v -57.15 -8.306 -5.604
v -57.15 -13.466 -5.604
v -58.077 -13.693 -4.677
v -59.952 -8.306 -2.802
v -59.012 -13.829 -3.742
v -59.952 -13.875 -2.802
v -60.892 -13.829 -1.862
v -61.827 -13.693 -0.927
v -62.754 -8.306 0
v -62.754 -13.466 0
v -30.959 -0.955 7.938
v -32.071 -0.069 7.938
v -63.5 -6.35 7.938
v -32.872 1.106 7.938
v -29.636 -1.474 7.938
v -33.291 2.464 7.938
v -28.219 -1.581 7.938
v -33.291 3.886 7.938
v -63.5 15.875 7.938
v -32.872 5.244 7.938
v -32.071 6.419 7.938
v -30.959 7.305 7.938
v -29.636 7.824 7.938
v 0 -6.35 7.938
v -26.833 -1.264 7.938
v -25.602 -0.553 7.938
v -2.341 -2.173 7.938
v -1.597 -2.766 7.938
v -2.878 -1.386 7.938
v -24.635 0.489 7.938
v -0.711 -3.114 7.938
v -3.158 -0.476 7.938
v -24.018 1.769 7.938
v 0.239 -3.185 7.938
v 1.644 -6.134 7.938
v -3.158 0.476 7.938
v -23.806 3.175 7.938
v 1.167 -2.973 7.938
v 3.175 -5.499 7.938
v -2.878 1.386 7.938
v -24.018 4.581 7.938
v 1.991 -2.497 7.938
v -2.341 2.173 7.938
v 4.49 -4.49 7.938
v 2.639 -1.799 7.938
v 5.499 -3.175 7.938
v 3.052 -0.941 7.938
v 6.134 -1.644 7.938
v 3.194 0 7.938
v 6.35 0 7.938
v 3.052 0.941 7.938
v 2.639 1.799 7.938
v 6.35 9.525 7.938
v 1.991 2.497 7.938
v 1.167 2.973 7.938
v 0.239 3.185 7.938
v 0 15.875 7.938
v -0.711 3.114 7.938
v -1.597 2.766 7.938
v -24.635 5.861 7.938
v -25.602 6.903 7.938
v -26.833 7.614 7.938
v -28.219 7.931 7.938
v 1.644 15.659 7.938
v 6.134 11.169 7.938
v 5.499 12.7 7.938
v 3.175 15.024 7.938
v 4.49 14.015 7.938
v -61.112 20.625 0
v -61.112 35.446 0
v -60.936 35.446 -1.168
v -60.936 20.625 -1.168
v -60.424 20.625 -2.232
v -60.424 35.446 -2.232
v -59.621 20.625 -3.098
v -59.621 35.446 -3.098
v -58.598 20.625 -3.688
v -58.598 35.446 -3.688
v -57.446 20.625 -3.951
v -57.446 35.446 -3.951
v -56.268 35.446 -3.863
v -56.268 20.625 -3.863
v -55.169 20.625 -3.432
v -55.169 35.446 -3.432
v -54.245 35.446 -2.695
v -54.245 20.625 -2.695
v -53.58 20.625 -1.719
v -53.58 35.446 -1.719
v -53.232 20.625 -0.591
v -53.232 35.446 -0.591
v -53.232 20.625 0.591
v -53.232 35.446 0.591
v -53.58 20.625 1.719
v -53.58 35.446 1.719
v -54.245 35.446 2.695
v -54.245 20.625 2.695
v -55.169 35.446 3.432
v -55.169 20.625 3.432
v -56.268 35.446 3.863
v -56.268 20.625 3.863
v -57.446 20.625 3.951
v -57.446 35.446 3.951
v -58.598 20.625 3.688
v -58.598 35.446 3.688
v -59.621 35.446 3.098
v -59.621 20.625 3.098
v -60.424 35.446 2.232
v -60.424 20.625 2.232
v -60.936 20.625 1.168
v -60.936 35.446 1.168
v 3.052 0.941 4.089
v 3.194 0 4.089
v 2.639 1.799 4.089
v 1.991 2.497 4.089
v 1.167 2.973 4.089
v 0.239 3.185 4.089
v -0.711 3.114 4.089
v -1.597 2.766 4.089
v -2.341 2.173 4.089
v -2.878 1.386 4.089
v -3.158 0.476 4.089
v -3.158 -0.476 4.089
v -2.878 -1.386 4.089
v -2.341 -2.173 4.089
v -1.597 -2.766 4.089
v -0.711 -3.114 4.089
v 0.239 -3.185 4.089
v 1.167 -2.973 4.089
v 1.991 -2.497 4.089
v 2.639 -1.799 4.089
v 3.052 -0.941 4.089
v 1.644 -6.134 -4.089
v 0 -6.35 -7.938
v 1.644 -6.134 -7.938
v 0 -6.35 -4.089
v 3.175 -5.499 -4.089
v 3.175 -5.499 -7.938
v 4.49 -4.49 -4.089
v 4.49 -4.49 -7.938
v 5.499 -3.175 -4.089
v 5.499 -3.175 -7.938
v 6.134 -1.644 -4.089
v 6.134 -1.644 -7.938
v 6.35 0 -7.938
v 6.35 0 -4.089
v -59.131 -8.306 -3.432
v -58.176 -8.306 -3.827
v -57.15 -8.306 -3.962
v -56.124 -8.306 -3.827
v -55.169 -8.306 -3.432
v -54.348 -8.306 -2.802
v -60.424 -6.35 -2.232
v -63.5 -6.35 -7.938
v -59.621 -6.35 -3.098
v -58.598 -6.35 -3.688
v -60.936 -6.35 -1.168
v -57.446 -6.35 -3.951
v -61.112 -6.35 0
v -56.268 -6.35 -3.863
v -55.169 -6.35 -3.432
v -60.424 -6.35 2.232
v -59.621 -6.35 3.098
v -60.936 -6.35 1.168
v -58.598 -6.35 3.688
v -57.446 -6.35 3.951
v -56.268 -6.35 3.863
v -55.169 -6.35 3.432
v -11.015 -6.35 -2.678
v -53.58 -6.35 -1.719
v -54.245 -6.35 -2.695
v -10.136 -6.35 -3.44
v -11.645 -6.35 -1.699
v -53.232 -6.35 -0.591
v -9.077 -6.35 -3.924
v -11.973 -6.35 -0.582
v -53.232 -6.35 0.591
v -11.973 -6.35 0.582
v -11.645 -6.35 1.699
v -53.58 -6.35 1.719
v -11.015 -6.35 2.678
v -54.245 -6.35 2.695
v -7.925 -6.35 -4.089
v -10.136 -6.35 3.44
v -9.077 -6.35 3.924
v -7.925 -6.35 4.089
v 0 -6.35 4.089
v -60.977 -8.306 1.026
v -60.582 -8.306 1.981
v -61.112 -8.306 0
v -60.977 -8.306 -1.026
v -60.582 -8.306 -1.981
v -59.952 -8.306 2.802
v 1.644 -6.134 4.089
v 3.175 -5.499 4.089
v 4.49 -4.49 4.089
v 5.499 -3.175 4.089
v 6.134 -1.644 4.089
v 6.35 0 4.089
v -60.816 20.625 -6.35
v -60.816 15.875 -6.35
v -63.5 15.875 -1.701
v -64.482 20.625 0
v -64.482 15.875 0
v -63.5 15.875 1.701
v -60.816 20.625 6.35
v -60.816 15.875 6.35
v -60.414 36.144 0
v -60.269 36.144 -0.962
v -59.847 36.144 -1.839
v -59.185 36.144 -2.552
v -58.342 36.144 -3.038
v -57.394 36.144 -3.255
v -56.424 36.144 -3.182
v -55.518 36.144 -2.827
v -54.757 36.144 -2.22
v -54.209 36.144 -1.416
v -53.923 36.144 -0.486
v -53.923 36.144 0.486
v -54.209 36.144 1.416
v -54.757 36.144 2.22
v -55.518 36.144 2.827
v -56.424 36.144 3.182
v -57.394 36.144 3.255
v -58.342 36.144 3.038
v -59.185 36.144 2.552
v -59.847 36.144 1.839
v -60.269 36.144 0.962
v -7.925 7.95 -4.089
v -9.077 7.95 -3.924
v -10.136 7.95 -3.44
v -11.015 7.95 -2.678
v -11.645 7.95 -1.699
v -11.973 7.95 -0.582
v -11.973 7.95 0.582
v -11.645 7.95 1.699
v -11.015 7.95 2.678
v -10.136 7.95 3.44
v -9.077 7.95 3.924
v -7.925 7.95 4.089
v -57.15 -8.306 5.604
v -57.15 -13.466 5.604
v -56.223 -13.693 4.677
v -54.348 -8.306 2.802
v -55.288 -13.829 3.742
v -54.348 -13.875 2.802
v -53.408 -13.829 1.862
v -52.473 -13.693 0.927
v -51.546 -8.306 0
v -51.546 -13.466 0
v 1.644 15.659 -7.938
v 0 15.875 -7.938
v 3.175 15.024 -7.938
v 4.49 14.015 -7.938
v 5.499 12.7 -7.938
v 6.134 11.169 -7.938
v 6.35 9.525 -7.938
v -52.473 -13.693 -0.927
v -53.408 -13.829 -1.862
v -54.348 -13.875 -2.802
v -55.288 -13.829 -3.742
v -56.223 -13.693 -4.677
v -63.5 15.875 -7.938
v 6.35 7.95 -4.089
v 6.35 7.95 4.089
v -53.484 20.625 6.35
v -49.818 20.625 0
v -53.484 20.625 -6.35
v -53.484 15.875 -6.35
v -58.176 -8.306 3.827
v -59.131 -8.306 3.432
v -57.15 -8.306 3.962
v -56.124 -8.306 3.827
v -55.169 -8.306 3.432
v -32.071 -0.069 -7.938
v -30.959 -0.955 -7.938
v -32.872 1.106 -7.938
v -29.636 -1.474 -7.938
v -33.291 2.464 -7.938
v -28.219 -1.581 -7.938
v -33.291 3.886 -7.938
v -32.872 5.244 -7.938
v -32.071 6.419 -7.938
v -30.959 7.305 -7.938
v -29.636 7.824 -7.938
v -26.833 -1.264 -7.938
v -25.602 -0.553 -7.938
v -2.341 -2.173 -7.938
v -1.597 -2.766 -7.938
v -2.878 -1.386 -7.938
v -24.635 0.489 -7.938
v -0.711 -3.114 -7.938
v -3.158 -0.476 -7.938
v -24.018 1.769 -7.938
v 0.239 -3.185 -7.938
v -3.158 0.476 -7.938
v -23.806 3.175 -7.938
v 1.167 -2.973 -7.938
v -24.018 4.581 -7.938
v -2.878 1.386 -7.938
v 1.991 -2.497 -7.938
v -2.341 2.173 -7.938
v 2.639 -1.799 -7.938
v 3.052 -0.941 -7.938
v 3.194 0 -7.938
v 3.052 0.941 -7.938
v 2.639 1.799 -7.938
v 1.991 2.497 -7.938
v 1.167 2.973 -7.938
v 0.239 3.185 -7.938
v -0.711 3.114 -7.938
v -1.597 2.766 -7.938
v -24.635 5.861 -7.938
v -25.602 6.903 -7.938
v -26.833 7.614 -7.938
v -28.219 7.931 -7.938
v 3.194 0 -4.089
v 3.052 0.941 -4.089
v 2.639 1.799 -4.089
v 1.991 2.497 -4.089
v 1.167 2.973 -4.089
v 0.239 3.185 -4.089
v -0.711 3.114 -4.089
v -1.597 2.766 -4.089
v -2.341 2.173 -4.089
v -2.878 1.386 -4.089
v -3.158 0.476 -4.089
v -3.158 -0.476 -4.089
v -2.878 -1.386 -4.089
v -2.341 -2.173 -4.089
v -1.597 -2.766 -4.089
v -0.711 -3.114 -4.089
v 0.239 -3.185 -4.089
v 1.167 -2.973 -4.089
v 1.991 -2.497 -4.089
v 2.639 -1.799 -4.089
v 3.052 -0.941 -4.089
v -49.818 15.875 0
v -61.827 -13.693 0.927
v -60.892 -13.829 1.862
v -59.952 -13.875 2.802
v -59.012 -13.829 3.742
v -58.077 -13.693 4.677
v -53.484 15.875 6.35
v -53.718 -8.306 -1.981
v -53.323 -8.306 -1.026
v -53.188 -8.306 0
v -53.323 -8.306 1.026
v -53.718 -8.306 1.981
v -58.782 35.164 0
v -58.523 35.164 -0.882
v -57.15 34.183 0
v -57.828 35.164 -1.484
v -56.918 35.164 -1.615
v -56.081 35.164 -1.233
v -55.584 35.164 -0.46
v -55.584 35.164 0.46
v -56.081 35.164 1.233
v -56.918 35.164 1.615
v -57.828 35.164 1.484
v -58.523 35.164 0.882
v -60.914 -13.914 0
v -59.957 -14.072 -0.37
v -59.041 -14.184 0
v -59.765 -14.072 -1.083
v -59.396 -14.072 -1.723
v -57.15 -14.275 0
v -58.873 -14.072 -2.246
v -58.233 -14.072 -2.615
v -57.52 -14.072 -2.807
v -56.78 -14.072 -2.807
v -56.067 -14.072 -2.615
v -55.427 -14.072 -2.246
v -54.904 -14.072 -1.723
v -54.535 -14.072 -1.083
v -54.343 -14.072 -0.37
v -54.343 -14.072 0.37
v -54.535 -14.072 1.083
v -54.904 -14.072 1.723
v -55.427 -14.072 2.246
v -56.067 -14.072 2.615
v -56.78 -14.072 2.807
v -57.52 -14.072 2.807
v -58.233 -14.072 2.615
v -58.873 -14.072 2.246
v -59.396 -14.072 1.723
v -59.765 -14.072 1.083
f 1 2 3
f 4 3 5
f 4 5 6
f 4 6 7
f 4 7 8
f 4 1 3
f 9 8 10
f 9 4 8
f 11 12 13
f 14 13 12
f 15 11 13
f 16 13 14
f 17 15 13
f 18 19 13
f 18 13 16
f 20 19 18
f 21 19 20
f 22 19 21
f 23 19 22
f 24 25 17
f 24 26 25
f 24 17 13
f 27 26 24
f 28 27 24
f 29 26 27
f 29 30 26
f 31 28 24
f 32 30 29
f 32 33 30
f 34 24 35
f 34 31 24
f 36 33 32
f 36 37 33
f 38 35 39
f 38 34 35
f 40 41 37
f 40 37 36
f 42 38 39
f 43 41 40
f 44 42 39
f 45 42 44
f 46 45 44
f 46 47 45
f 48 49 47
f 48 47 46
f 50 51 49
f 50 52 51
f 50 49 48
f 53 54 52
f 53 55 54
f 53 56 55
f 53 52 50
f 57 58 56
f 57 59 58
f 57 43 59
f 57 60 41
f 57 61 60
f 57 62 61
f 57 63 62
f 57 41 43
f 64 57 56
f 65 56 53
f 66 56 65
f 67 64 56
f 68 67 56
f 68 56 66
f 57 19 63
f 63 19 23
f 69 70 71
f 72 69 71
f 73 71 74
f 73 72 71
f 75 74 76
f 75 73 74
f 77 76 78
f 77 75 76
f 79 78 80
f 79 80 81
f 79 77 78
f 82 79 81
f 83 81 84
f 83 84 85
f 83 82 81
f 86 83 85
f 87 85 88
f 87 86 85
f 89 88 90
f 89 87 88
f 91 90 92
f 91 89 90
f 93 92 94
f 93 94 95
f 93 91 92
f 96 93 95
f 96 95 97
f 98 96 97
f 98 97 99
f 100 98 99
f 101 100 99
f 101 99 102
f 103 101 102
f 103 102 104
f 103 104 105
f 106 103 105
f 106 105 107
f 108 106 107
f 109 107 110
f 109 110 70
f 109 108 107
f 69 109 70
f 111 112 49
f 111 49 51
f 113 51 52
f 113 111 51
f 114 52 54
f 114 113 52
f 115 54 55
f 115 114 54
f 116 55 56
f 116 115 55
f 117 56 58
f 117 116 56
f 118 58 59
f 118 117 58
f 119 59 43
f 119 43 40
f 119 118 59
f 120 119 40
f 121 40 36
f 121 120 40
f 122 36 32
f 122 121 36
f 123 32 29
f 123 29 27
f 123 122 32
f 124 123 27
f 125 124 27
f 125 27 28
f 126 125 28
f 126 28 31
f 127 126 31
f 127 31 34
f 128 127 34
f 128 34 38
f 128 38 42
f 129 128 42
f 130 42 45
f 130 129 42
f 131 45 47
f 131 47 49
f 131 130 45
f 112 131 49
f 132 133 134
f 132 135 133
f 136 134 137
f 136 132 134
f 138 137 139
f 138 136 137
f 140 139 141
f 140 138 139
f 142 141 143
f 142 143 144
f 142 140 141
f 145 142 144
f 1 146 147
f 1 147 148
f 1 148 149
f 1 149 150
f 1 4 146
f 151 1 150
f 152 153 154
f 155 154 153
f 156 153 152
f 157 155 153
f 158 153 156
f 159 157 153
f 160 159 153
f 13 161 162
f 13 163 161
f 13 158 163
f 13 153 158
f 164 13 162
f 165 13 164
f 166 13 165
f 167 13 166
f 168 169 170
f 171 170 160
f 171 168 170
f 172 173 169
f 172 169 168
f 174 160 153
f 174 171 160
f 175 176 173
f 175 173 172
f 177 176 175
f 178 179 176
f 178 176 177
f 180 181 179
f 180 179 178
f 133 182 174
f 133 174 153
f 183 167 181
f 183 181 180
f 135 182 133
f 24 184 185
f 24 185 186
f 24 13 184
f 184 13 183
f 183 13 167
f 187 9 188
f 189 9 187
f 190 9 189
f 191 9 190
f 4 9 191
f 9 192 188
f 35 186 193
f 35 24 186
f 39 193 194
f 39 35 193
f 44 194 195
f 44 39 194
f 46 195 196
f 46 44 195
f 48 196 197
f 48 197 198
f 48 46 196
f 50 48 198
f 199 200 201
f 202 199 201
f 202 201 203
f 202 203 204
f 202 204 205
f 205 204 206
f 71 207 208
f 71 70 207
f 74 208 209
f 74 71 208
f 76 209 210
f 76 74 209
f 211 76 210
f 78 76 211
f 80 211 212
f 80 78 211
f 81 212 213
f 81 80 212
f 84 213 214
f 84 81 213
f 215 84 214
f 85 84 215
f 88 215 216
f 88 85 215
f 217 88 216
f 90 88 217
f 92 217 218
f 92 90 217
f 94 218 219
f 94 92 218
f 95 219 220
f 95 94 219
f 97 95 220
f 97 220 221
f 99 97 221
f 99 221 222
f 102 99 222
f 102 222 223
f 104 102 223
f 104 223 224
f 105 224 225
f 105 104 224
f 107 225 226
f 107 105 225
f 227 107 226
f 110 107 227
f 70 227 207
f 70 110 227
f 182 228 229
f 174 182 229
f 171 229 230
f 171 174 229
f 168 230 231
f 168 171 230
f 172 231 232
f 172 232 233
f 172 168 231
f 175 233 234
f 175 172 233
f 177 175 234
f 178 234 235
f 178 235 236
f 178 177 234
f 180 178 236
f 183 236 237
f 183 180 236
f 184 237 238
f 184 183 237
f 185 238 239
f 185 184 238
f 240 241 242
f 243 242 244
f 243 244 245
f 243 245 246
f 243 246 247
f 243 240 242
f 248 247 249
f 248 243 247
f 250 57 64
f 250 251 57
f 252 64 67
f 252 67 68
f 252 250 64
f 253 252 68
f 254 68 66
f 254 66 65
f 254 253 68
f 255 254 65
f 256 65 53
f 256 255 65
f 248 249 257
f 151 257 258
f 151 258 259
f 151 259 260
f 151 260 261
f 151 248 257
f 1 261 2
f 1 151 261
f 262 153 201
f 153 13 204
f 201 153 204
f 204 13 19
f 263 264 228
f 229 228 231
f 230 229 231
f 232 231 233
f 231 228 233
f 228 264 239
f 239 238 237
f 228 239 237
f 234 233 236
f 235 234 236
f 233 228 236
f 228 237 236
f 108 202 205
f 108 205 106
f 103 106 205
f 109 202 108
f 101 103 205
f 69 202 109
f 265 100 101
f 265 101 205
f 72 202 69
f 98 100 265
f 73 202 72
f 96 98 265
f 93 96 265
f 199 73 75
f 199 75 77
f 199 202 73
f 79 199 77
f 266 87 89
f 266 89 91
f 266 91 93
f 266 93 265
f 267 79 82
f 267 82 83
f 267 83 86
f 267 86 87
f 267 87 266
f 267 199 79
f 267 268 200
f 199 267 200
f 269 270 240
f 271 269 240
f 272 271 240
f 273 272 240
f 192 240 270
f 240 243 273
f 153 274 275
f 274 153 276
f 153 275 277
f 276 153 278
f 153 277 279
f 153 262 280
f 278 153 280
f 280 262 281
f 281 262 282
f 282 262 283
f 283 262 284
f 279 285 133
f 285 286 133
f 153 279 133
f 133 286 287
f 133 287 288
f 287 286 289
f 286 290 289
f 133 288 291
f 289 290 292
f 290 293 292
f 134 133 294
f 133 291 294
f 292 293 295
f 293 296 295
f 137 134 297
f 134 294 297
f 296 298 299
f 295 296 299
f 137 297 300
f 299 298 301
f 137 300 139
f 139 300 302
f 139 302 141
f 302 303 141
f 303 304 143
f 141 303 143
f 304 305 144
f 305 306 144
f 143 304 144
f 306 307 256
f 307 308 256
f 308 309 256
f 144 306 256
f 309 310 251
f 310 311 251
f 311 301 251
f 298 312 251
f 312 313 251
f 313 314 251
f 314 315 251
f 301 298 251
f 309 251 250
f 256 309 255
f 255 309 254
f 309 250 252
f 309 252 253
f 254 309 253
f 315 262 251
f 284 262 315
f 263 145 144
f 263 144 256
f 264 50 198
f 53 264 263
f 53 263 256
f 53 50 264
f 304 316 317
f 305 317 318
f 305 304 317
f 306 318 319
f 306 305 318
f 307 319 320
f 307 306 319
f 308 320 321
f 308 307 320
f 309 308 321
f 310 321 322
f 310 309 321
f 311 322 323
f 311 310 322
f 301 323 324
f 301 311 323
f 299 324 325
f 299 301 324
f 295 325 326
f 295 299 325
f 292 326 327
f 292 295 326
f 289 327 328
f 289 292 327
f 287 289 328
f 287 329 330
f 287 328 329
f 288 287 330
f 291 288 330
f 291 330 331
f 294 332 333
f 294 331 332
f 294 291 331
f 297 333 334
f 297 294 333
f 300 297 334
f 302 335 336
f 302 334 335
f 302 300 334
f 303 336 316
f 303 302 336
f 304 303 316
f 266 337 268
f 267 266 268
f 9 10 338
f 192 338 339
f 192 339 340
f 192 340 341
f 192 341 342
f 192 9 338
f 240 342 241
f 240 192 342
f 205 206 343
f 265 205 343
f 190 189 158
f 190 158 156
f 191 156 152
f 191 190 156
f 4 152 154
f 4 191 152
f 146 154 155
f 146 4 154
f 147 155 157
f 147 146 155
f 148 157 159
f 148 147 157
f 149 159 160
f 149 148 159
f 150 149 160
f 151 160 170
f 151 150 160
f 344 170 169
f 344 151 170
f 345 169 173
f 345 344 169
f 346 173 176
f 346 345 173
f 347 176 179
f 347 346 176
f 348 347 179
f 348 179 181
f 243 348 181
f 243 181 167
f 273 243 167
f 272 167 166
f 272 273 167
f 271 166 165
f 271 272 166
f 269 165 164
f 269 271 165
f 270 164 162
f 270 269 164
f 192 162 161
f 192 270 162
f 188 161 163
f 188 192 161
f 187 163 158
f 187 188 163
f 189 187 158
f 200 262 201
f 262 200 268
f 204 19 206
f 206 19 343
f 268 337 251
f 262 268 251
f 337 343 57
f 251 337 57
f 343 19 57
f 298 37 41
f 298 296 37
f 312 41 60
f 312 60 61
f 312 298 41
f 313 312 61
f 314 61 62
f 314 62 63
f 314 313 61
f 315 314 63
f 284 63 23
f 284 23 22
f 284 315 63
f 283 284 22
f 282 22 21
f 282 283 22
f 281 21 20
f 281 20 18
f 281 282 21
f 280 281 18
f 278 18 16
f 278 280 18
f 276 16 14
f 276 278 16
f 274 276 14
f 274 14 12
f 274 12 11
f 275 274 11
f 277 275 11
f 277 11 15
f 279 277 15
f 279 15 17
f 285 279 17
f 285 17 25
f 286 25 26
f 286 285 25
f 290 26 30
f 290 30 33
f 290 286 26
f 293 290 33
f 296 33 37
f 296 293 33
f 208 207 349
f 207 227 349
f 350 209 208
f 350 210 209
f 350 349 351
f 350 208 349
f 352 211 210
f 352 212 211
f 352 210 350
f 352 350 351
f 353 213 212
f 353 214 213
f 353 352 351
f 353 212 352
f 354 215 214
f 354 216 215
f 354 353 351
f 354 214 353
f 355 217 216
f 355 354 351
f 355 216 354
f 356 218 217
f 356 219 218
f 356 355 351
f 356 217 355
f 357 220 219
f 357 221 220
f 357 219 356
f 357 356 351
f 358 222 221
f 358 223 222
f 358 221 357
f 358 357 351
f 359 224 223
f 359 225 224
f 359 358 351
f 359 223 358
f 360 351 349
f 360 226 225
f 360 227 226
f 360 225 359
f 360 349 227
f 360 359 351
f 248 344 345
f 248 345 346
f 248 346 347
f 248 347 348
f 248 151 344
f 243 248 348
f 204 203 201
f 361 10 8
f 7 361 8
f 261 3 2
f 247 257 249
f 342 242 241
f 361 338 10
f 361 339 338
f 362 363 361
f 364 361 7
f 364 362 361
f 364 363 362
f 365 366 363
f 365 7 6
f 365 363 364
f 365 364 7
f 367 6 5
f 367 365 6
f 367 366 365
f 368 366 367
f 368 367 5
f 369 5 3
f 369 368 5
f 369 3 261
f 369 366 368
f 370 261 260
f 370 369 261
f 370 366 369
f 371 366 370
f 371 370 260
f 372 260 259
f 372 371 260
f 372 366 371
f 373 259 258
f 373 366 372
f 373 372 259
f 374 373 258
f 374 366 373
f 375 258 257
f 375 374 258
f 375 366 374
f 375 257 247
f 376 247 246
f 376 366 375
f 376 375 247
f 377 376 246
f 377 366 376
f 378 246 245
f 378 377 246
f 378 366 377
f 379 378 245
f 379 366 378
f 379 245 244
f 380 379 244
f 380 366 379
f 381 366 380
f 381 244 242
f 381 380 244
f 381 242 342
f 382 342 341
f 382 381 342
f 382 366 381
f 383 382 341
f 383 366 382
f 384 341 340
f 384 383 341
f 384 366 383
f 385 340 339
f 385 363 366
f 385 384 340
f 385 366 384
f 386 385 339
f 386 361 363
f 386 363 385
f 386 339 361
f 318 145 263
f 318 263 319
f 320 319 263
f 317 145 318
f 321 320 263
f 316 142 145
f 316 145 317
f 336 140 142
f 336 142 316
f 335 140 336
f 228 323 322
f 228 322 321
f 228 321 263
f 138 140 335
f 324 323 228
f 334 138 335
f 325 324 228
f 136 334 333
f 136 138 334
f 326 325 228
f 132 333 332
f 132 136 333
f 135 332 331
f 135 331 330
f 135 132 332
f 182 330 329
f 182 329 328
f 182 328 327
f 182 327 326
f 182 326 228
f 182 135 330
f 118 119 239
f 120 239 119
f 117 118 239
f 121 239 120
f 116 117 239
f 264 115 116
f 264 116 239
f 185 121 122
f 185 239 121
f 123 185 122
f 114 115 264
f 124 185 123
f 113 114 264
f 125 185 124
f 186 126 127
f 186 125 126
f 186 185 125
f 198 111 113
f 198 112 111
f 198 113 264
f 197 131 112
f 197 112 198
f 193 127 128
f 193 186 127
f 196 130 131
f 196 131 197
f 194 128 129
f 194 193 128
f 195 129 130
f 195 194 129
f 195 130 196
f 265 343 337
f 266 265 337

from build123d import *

# Parameters (mm, degrees)
SKETCH11_W         = 69.85
SKETCH11_H         = 22.225
SKETCH11_R         = 3.19405
SKETCH11_R_2       = 4.76885
EXTRUDE3_DEPTH     = 7.9375
CUT_EXTRUDE1_DEPTH = 14.3002
FILLET1_R          = 6.35
EXTRUDE4_DEPTH     = 4.7498
SKETCH15_R         = 13.386908493
CUT_EXTRUDE2_DEPTH = 6.969


with BuildPart() as part:
    # Sketch11 → Extrude3 (new body, symmetric)
    with BuildSketch(Plane.XY):
        with Locations((-28.575, 4.7625)):
            Rectangle(SKETCH11_W, SKETCH11_H)
        Circle(SKETCH11_R, mode=Mode.SUBTRACT)
        with Locations((-28.575, 3.175)):
            Circle(SKETCH11_R_2, mode=Mode.SUBTRACT)
    extrude(amount=EXTRUDE3_DEPTH, both=True)

    # Sketch12 → Cut-Extrude1 (cut)
    with BuildSketch(Plane.XZ.offset(6.35)):
        with BuildLine():
            Line((-7.9248, 4.0894), (6.35, 4.0894))
            Line((6.35, 4.0894), (6.35, -4.0894))
            Line((6.35, -4.0894), (-7.9248, -4.0894))
            ThreePointArc((-7.9248, -4.0894), (-12.0142, 0), (-7.9248, 4.0894))
        make_face()
    extrude(amount=-CUT_EXTRUDE1_DEPTH, mode=Mode.SUBTRACT)

    # Fillet1
    fillet1_edges = [part.edges().sort_by_distance(p)[0] for p in [
        (6.35, -6.35, -6.01345),
        (6.35, 15.875, 0),
        (6.35, -6.35, 6.01345),
    ]]
    fillet(fillet1_edges, radius=FILLET1_R)

    # Sketch13 → Extrude4 (add)
    with BuildSketch(Plane(origin=(0, 15.875, 0), x_dir=(1, 0, 0), z_dir=(0, 1, 0))):
        Polygon((-49.817651581, 0), (-53.483825791, 6.35), (-60.816174209, 6.35), (-64.482348419, 0), (-60.816174209, -6.35), (-53.483825791, -6.35), align=None)
    extrude(amount=EXTRUDE4_DEPTH)

    # Sketch14 → Revolve2 (revolve)
    with BuildSketch(Plane.XY):
        with BuildLine():
            Line((-57.15, 34.183051026), (-60.4139, 36.1442))
            Line((-60.4139, 36.1442), (-61.1124, 35.4457))
            Line((-61.1124, 35.4457), (-61.1124, -8.3058))
            Line((-61.1124, -8.3058), (-70.536908493, -8.3058))
            Line((-70.536908493, -8.3058), (-70.536908493, -9.0678))
            ThreePointArc((-70.536908493, -9.0678), (-64.331959482, -12.927219893), (-57.15, -14.2748))
            Line((-57.15, -14.2748), (-57.15, 34.183051026))
        make_face()
    revolve(axis=Axis((-57.15, 26.585218564, 0), (0, -1, 0)))

    # Sketch15 → Cut-Extrude2 (cut, through all)
    with BuildSketch(Plane(origin=(0, -8.3058, 0), x_dir=(1, 0, 0), z_dir=(0, 1, 0))):
        with Locations((-57.15, 0)):
            Circle(SKETCH15_R)
        Polygon((-57.15, 5.60367982), (-62.75367982, 0), (-57.15, -5.60367982), (-51.54632018, 0), align=None, mode=Mode.SUBTRACT)
    extrude(amount=-CUT_EXTRUDE2_DEPTH, mode=Mode.SUBTRACT)


solid = part.part
